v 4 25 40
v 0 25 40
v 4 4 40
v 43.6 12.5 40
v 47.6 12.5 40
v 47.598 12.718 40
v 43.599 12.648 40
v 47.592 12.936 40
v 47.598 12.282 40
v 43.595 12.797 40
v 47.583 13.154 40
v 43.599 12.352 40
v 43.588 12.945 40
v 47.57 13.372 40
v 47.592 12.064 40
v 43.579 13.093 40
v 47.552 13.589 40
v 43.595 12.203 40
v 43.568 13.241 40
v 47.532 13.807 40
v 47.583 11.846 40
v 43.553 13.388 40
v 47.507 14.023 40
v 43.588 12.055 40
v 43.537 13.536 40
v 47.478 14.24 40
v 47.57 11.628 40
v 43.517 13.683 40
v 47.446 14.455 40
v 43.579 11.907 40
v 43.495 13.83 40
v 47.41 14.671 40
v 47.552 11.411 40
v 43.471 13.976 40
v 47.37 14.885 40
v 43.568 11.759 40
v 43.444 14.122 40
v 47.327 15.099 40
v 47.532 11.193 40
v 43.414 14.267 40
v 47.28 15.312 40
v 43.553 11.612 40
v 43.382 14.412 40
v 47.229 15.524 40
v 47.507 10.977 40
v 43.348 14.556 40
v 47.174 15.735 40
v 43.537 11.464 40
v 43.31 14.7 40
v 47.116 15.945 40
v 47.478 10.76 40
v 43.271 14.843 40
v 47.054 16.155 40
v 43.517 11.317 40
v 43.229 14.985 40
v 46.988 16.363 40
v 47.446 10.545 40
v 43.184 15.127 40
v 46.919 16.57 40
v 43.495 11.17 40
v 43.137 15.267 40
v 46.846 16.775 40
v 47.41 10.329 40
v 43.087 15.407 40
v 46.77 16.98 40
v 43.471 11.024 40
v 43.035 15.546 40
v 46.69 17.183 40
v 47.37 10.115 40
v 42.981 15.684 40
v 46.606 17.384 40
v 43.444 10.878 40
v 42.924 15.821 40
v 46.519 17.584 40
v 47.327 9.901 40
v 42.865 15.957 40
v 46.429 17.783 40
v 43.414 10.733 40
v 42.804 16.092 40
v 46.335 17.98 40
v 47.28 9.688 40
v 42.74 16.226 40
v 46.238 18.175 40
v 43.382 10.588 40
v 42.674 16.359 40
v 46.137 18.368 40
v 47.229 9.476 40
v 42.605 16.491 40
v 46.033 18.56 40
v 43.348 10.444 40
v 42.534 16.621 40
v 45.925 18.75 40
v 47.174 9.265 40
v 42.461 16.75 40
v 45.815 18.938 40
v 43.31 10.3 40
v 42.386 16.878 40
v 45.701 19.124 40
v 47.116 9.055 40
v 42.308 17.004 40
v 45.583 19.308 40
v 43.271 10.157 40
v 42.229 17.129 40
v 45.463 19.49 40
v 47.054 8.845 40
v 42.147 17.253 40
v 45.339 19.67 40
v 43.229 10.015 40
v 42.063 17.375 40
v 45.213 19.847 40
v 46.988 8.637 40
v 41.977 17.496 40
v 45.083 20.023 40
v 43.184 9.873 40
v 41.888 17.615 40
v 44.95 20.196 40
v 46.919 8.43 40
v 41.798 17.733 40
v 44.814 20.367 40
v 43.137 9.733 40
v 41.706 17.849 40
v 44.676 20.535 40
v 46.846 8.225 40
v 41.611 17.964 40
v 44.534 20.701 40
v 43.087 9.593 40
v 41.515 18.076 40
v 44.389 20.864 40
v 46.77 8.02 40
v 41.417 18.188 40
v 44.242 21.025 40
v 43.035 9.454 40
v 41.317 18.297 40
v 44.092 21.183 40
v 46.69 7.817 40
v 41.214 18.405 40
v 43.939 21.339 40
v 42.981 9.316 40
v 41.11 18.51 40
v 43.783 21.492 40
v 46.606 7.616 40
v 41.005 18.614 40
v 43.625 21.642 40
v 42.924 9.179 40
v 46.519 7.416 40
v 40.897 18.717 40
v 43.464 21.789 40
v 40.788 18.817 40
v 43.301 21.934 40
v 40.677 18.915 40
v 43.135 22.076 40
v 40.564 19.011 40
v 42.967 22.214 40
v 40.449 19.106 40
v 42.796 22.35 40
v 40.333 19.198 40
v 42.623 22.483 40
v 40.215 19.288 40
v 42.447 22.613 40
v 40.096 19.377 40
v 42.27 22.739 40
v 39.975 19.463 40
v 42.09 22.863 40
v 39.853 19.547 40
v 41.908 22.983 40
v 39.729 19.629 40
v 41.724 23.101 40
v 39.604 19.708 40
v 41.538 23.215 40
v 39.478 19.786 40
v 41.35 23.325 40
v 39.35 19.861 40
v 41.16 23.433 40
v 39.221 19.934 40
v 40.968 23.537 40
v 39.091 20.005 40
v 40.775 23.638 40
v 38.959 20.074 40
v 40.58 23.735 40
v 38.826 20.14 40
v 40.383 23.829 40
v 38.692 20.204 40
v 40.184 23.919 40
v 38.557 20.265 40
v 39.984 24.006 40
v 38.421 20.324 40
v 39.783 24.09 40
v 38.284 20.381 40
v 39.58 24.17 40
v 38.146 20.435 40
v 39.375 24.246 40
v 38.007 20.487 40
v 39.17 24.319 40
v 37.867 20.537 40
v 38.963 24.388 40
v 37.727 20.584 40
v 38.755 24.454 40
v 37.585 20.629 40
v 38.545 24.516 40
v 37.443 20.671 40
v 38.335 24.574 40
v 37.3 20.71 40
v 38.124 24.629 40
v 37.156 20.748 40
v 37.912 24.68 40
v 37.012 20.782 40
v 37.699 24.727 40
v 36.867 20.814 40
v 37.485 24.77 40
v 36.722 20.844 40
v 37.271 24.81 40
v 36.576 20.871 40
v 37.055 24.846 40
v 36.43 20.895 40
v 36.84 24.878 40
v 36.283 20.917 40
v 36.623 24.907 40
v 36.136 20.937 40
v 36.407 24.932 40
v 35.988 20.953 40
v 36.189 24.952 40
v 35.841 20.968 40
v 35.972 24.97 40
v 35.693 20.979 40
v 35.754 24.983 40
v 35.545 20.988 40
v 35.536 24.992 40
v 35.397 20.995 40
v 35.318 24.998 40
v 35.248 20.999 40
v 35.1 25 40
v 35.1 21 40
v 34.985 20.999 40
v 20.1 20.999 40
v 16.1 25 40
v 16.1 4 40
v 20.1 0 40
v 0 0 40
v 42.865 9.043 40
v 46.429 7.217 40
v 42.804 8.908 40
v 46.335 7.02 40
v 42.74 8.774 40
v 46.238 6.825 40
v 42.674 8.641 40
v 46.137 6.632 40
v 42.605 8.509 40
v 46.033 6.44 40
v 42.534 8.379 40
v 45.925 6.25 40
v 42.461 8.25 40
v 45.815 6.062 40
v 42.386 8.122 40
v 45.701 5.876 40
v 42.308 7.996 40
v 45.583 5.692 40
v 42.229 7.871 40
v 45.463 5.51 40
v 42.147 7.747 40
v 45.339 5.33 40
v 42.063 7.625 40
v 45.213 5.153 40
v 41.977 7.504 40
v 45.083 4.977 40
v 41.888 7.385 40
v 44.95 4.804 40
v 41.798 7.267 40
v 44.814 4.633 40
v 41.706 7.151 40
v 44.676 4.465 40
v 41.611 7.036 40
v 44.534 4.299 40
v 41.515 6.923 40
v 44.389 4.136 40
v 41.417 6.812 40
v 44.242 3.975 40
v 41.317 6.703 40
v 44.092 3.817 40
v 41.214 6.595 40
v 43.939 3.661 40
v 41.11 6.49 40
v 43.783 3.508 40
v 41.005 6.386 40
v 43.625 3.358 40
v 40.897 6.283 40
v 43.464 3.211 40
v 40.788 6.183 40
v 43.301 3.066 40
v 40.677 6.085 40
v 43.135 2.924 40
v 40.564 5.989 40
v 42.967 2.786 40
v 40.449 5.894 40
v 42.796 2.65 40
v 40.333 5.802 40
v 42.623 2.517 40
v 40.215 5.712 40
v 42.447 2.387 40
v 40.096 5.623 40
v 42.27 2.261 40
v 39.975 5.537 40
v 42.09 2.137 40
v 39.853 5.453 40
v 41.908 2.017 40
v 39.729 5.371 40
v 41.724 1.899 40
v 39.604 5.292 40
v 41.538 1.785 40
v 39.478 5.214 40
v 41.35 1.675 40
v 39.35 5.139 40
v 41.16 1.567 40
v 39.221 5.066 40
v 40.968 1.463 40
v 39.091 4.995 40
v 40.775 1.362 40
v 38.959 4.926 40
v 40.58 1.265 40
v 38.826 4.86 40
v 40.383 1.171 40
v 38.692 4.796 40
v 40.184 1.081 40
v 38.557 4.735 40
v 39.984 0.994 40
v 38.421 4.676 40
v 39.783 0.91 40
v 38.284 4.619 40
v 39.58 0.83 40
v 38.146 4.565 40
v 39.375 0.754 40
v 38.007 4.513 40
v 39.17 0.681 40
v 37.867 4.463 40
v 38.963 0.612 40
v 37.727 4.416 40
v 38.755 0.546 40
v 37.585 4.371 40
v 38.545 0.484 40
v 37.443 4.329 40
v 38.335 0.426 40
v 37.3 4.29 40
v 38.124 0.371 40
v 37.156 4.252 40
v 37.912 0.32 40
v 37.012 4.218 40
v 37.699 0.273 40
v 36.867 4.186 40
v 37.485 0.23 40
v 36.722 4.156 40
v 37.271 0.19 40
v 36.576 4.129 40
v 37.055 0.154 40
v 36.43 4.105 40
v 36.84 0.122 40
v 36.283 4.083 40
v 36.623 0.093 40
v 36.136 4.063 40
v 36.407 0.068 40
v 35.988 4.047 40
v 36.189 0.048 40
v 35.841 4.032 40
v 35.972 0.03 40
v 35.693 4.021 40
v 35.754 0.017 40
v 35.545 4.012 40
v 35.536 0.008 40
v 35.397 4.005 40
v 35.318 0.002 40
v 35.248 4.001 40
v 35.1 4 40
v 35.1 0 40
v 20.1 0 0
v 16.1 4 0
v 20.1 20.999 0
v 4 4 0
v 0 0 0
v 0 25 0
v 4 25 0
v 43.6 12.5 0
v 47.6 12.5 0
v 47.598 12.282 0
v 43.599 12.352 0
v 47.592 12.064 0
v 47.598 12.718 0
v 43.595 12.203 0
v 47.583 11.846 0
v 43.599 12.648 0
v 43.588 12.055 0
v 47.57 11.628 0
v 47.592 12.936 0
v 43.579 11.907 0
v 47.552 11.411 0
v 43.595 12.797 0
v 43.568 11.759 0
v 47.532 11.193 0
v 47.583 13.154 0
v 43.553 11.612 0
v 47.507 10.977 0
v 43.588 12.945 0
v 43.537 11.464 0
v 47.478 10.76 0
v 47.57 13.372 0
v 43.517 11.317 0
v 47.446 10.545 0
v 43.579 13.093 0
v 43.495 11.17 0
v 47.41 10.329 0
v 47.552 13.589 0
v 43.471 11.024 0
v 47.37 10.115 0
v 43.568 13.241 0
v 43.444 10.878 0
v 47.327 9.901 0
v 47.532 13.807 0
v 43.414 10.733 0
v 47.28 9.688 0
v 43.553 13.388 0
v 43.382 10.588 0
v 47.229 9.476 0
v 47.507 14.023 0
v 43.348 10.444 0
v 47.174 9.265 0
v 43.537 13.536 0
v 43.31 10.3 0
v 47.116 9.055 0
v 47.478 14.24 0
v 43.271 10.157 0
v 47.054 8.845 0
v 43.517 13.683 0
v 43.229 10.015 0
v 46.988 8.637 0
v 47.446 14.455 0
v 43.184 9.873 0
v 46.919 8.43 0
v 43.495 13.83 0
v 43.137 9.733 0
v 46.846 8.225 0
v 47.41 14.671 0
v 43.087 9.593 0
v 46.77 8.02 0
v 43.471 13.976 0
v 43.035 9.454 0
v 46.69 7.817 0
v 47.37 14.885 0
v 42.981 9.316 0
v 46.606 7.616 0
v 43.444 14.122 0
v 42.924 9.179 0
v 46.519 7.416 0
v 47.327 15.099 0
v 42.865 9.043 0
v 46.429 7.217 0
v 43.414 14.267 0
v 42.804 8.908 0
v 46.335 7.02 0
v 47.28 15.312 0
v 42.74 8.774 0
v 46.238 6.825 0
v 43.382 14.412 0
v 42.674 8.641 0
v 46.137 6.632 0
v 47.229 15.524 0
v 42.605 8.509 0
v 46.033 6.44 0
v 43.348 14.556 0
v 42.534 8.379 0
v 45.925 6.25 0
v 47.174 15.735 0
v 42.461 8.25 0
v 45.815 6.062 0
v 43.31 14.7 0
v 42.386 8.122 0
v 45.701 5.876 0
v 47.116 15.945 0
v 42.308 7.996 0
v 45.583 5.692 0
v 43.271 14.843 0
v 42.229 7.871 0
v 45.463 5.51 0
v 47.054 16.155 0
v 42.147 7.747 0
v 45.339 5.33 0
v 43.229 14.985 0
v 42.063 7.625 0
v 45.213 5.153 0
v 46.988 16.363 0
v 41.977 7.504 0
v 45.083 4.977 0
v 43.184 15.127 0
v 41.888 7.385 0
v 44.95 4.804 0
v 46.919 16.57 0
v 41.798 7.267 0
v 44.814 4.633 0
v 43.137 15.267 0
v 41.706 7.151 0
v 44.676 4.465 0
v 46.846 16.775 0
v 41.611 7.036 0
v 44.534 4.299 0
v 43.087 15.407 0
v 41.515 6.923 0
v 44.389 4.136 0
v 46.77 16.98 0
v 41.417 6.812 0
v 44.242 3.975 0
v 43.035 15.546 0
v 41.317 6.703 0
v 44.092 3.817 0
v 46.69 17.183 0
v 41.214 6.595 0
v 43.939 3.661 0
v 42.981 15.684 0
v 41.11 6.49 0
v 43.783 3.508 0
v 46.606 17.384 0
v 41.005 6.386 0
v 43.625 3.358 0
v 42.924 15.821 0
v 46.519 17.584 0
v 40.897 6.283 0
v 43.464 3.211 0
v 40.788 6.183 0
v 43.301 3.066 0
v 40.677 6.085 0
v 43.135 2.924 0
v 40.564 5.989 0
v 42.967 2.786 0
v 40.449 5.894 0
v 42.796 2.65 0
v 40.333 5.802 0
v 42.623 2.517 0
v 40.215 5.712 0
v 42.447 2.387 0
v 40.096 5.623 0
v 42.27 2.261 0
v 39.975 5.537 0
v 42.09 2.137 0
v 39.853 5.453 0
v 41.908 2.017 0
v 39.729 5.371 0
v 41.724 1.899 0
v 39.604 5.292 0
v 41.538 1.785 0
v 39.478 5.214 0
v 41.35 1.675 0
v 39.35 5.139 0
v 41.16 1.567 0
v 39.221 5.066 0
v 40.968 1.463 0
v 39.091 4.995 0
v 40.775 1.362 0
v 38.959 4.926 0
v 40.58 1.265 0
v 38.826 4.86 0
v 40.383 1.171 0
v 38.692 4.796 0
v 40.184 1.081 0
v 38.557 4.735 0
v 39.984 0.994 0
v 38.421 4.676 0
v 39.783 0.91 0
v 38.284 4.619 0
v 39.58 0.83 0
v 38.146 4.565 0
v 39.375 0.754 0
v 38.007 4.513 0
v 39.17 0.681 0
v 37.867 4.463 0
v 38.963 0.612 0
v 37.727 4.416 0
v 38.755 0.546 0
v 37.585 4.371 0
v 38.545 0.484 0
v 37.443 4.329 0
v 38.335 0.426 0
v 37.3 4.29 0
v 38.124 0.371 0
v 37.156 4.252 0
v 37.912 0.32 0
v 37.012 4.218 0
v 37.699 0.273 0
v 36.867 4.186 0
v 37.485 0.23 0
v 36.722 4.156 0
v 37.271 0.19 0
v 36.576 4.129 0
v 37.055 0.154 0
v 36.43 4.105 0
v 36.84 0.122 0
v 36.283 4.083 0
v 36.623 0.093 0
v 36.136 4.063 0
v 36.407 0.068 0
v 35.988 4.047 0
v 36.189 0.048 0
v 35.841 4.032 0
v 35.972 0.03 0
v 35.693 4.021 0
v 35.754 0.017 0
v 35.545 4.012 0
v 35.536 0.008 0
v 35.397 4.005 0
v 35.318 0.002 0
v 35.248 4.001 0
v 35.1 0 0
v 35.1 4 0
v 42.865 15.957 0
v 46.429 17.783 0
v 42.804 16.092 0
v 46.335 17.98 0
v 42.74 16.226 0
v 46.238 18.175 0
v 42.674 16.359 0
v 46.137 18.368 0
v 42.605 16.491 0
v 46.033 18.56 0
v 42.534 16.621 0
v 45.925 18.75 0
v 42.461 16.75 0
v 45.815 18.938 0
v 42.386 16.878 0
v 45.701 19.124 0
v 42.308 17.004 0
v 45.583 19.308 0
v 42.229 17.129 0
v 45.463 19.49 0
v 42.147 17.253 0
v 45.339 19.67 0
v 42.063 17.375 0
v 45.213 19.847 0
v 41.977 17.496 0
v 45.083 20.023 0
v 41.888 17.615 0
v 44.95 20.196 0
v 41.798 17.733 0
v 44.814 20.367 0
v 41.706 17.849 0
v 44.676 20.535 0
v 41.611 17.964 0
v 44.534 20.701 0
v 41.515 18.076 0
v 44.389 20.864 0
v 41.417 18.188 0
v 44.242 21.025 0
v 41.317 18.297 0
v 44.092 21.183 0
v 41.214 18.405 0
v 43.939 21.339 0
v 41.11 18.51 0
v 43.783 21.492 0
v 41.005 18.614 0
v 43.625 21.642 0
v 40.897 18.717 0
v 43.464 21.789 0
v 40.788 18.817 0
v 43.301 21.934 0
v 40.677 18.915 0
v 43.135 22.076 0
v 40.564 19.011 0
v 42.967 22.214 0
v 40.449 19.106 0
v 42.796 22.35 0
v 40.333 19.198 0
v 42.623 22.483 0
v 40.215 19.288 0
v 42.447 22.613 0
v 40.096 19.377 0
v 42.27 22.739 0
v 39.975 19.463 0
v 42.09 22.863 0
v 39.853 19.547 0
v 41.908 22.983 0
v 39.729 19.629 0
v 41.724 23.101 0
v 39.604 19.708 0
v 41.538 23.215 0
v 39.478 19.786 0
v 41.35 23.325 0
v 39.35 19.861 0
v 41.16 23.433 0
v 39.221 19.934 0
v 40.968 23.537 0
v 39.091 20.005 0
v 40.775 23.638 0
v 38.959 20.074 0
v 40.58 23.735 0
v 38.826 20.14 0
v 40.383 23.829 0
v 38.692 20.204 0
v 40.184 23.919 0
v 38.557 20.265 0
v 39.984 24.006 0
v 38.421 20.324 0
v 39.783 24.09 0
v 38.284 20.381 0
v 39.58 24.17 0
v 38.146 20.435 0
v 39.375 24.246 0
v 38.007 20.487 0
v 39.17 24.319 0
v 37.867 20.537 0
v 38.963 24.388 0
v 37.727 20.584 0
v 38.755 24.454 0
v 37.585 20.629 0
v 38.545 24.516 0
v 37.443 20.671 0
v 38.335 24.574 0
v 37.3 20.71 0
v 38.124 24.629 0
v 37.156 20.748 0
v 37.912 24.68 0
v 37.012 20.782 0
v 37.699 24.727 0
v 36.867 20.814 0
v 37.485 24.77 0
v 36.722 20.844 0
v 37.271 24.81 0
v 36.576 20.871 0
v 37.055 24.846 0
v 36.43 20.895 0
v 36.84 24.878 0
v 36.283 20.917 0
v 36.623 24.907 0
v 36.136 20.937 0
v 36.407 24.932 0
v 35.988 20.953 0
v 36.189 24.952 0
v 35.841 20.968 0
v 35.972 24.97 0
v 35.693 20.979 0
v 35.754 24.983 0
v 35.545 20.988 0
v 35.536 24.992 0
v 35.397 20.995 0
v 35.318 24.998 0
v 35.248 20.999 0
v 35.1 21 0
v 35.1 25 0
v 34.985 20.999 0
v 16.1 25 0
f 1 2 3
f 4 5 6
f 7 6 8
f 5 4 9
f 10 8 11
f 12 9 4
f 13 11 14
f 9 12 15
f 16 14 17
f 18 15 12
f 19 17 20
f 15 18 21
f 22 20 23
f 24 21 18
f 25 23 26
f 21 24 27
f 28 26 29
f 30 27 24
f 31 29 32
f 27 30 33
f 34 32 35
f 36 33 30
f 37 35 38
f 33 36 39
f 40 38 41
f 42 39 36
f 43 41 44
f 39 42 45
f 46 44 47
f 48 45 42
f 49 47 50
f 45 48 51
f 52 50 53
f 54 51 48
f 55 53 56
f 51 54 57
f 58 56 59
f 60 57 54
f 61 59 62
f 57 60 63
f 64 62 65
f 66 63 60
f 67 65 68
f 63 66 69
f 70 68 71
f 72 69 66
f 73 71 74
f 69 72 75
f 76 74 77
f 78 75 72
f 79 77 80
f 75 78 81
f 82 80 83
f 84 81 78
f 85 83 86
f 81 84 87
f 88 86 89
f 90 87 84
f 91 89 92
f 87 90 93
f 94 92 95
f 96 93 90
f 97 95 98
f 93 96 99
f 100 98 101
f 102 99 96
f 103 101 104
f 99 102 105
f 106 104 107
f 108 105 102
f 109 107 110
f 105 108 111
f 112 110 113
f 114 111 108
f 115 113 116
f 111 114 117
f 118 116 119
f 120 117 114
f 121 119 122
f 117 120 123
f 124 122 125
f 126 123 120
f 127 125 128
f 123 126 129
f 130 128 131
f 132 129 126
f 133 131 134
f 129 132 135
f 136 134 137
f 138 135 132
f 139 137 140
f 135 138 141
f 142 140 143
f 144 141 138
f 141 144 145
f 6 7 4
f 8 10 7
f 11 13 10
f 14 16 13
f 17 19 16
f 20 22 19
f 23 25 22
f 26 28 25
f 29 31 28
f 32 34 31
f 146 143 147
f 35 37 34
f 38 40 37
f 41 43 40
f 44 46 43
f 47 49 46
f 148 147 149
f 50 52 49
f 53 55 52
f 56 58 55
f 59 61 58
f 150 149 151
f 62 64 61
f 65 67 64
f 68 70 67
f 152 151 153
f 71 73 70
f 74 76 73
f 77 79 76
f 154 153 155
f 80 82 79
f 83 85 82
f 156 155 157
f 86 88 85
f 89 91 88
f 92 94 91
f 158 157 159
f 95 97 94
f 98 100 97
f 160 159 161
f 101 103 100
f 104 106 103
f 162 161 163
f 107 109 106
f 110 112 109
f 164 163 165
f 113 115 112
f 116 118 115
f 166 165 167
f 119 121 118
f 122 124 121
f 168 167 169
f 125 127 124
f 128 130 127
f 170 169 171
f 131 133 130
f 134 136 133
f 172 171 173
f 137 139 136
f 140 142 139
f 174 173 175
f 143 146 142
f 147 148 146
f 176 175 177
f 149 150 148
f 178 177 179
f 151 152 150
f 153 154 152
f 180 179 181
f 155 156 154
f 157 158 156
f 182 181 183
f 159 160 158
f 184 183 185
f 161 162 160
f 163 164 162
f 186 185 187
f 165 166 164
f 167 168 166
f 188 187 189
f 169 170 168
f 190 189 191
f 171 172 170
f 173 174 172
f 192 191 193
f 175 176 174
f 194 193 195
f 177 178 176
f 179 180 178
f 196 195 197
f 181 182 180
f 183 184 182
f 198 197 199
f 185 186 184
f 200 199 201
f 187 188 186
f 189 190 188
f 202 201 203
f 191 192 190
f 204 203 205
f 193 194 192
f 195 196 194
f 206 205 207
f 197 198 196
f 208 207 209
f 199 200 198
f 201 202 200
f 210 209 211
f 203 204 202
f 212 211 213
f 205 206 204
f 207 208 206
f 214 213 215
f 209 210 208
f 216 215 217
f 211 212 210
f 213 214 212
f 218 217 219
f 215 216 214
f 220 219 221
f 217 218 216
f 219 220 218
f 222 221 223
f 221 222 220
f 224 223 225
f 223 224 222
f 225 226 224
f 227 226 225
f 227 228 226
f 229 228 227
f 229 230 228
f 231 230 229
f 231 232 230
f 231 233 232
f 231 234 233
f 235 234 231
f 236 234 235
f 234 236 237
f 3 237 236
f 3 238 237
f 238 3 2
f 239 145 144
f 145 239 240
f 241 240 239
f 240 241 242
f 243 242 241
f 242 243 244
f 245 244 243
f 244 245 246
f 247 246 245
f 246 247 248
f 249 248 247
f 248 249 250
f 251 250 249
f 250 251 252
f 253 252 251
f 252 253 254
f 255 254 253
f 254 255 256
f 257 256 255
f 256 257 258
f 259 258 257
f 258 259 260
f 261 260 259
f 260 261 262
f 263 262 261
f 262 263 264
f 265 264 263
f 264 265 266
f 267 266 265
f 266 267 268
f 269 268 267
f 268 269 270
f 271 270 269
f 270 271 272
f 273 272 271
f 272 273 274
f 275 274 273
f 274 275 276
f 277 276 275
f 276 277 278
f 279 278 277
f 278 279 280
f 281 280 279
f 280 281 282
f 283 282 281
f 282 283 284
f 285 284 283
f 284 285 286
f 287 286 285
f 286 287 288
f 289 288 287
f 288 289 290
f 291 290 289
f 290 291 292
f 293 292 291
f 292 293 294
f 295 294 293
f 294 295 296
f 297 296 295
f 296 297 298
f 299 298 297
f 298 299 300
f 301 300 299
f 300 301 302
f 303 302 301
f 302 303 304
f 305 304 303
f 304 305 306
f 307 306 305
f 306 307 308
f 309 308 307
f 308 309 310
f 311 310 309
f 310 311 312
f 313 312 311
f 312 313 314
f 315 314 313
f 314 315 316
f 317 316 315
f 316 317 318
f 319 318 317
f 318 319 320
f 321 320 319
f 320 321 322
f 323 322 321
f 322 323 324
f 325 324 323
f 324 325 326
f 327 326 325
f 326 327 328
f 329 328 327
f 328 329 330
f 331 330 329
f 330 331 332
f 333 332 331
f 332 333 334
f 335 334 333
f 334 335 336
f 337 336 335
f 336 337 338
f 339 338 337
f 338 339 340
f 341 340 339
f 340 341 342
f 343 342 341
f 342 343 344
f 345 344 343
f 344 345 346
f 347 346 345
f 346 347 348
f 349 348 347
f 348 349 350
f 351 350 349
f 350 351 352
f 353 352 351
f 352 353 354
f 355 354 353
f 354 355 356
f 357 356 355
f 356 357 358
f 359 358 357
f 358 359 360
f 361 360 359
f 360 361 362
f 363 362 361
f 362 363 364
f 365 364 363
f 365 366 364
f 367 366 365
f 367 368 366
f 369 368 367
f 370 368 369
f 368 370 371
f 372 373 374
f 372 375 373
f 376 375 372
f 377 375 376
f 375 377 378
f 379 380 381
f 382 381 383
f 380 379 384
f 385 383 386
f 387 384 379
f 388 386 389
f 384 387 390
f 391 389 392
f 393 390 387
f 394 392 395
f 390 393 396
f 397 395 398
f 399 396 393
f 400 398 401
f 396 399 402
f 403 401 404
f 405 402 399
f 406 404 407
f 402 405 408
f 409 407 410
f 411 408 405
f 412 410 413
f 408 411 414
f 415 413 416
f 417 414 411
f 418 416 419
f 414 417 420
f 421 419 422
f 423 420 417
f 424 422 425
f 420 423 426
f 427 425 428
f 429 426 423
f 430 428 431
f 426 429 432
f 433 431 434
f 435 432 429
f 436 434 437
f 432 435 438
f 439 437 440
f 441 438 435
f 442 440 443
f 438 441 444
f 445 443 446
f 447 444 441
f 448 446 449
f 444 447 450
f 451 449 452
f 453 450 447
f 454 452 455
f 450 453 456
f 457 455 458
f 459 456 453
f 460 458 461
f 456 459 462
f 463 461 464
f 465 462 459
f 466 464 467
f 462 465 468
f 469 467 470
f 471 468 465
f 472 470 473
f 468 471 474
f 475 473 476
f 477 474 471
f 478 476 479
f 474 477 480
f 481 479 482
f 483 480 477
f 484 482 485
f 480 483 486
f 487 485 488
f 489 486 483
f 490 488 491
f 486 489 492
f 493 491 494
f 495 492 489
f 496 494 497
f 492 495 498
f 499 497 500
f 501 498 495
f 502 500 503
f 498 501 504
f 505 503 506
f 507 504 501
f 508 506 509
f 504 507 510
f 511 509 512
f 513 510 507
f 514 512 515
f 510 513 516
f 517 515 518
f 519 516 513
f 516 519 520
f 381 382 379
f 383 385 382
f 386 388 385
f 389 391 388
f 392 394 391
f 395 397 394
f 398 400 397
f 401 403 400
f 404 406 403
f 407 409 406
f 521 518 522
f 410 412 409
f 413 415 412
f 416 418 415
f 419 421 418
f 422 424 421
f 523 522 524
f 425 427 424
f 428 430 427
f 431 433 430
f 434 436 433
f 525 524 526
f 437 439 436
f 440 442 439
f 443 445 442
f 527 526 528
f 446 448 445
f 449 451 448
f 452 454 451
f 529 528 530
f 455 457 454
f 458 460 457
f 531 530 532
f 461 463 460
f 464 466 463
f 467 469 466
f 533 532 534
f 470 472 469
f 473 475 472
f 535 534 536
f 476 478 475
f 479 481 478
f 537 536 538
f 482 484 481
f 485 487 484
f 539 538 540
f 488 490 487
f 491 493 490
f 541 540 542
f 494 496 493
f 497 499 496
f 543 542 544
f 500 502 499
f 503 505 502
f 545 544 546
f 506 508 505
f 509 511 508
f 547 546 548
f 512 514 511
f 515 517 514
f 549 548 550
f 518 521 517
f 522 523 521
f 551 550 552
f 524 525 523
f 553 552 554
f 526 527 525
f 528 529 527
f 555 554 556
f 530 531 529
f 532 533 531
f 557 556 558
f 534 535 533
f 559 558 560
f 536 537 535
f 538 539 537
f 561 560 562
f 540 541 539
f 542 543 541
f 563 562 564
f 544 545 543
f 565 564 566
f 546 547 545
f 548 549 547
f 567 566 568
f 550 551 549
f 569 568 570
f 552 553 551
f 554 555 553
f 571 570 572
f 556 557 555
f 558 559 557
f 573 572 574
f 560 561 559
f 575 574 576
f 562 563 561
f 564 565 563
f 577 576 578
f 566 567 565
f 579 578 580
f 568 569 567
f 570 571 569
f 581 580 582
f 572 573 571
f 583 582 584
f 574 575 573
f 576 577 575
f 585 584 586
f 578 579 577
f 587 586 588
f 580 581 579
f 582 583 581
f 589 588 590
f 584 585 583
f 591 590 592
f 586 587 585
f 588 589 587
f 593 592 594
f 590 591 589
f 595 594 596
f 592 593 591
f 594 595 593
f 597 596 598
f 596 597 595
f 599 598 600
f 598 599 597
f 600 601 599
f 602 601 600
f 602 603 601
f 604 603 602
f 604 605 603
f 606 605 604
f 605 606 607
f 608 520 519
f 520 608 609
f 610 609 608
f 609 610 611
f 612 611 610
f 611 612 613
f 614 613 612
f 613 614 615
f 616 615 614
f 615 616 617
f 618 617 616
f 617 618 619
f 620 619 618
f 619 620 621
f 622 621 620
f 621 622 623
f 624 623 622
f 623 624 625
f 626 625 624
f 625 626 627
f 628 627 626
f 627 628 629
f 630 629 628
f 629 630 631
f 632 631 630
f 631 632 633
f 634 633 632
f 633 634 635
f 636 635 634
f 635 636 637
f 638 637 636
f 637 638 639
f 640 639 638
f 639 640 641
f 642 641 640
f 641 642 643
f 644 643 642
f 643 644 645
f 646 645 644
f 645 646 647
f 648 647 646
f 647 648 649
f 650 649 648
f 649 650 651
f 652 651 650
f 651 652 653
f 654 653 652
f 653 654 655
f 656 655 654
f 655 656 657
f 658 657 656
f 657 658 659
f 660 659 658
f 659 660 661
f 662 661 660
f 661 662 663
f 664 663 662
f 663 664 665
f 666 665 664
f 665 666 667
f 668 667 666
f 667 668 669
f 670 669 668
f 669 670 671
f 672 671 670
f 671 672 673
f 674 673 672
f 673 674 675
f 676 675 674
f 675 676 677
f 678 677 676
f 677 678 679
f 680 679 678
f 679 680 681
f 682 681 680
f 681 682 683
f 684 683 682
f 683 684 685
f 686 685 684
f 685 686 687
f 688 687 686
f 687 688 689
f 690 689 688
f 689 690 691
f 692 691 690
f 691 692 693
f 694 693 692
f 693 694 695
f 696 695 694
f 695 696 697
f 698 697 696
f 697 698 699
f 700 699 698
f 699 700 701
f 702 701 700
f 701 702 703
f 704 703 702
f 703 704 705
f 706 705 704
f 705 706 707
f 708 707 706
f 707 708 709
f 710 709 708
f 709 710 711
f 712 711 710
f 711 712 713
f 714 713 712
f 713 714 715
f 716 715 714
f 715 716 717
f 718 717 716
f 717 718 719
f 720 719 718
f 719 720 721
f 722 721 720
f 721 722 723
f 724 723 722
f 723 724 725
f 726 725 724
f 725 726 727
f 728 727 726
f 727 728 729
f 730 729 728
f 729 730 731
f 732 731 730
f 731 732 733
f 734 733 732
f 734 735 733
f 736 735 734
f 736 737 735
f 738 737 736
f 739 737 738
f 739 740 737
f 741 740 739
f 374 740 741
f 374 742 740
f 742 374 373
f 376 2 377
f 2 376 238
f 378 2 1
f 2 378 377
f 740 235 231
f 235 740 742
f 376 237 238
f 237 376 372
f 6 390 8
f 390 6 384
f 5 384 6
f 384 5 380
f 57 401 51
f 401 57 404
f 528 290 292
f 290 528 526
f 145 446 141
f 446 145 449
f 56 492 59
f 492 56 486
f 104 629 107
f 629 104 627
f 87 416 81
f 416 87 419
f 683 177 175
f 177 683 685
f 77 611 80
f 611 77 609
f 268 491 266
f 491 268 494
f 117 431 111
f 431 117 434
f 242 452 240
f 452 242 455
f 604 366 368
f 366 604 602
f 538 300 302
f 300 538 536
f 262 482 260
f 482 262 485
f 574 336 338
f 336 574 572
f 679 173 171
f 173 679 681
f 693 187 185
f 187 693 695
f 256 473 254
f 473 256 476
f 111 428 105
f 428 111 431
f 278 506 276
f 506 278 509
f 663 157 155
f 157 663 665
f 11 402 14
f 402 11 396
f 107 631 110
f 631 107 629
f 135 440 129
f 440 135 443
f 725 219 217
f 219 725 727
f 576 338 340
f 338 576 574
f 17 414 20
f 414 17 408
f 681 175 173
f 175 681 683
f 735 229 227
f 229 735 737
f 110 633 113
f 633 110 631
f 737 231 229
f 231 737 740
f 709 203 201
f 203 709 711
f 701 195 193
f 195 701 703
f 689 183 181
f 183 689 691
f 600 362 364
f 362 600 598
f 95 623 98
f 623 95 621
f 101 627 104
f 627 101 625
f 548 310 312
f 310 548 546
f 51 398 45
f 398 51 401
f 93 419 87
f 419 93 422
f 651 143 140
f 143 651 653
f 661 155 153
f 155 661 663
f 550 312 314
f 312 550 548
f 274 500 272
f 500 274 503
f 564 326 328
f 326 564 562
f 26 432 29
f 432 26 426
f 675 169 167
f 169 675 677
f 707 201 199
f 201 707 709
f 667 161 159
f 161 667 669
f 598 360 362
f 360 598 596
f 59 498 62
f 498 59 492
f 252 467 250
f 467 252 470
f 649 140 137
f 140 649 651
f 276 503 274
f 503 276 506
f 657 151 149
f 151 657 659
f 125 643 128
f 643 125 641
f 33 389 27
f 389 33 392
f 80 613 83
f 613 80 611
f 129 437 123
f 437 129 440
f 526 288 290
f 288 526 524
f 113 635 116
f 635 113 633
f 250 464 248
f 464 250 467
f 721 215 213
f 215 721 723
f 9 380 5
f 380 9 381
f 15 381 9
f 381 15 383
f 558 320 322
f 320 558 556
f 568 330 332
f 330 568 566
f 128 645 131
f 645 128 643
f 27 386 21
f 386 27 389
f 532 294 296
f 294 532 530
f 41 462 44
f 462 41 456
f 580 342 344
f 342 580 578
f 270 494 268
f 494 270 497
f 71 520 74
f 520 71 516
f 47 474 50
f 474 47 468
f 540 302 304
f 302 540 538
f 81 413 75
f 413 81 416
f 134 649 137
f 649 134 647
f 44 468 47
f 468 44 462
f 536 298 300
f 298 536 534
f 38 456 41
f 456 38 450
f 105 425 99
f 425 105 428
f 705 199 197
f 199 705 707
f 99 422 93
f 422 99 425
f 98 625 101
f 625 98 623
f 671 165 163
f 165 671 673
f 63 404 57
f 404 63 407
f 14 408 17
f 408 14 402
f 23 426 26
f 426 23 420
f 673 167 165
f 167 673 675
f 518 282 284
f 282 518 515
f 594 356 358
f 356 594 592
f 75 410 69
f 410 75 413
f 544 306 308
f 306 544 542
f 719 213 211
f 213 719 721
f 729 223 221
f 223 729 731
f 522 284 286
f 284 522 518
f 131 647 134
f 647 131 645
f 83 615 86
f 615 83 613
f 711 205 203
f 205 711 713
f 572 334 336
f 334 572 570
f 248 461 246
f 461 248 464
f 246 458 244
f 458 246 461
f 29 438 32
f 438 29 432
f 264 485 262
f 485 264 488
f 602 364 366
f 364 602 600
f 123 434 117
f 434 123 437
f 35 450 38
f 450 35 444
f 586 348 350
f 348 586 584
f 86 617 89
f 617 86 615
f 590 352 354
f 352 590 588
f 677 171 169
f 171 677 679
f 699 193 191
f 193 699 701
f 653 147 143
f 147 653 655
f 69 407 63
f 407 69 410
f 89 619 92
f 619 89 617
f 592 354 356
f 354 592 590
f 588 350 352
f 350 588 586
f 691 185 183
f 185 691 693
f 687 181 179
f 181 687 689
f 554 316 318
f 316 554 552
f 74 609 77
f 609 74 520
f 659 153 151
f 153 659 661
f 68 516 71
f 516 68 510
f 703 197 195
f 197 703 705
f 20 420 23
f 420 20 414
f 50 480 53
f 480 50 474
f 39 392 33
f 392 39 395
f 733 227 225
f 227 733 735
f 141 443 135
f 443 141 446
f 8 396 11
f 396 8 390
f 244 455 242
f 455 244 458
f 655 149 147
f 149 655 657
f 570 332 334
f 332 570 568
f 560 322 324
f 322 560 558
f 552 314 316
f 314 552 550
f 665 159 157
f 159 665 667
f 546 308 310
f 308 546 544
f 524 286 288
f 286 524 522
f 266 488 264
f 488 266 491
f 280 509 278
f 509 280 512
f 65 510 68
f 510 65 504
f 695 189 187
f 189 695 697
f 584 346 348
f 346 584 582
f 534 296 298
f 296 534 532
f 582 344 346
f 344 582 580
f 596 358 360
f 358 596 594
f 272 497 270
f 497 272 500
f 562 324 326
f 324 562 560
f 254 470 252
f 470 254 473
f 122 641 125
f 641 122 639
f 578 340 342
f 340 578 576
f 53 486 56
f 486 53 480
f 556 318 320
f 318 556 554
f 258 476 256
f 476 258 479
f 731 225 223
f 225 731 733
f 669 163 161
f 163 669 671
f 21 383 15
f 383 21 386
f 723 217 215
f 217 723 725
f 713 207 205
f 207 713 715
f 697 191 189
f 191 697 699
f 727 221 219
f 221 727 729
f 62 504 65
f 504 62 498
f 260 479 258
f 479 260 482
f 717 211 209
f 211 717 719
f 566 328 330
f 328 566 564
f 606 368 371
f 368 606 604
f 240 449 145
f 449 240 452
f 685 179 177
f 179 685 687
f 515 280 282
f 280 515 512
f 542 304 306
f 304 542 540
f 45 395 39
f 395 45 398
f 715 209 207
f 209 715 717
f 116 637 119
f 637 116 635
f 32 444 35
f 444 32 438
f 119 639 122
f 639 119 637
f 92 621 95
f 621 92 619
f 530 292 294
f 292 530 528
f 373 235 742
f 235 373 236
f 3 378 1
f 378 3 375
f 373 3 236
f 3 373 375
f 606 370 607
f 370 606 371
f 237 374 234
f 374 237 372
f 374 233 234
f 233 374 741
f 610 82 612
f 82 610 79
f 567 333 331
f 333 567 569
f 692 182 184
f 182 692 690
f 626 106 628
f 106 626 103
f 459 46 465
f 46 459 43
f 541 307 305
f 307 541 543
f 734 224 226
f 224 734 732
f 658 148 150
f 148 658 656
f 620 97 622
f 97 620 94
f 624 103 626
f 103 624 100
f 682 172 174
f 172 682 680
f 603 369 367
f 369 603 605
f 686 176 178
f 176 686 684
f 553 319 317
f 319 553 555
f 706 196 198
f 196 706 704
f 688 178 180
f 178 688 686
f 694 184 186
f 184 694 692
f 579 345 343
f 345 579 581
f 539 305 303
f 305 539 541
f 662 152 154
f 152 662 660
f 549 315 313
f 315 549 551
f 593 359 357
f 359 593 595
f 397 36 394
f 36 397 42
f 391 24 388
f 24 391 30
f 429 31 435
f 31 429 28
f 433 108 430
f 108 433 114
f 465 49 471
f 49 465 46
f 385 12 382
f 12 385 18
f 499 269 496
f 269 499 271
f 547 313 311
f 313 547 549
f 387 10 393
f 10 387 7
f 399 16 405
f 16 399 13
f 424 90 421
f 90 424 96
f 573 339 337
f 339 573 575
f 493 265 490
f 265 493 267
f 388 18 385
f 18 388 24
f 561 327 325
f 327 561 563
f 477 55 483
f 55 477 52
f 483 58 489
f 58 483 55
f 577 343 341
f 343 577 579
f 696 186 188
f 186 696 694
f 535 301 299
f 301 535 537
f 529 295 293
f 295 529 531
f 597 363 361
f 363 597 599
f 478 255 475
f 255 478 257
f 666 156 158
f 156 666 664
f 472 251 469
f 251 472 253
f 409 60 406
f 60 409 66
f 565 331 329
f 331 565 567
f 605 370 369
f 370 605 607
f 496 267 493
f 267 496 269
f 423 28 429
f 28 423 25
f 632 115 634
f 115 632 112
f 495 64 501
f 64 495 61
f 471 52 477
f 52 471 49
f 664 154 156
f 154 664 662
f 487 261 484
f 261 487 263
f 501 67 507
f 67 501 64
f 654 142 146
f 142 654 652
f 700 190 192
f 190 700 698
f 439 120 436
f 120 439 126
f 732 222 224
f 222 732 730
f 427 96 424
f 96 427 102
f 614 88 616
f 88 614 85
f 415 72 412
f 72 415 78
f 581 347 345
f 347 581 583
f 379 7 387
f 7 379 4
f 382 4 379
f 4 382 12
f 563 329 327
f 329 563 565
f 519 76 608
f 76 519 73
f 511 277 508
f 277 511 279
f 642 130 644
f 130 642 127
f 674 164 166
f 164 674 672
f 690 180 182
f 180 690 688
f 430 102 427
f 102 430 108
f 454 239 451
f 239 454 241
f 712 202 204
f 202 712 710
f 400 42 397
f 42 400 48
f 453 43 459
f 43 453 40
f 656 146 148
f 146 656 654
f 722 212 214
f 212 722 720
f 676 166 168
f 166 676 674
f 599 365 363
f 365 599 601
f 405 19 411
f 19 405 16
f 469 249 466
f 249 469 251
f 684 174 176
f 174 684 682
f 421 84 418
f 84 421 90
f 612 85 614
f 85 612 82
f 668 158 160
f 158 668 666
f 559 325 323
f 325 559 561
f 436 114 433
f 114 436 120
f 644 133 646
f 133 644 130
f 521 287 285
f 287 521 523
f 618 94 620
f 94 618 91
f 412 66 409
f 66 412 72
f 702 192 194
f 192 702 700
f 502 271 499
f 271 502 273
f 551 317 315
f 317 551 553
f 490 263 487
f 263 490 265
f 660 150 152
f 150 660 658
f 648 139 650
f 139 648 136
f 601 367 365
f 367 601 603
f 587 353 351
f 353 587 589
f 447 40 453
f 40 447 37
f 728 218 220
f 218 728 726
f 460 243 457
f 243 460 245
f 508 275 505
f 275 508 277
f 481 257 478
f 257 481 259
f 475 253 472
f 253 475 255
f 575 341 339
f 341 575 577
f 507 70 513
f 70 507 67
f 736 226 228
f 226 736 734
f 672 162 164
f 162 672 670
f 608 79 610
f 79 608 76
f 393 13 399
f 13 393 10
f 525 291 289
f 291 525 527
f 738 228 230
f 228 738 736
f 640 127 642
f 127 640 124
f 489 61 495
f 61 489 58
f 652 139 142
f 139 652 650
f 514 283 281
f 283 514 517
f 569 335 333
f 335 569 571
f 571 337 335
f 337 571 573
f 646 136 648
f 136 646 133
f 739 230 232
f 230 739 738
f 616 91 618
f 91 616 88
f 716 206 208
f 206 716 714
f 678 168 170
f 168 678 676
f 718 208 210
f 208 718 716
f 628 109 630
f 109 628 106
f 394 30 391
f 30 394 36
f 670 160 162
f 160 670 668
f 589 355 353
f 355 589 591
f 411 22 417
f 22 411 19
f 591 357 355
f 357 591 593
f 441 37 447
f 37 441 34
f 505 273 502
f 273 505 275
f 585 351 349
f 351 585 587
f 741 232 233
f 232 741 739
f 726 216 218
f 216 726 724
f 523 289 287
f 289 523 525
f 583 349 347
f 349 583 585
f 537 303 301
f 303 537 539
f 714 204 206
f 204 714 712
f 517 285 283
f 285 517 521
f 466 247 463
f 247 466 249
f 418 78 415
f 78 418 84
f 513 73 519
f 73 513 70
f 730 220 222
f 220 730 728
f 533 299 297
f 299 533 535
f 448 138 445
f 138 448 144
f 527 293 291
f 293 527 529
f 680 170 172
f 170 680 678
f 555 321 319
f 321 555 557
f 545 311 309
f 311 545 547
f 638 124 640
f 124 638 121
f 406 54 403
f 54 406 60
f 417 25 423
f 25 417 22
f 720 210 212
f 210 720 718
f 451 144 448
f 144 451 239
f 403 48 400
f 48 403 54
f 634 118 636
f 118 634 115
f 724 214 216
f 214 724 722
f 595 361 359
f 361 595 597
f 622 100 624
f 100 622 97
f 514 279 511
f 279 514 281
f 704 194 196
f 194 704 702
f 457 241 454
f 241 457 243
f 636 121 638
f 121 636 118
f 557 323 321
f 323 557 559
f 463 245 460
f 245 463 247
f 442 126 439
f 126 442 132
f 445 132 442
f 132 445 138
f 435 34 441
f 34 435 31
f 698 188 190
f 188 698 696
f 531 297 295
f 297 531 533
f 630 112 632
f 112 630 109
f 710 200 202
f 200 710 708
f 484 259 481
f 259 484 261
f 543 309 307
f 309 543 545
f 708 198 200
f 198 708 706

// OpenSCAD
// Stair Gate Latch

eps = 0.001;
$fa = 1.0;
$fs = 0.1;

item_h = 40;
item_d = 25;

// 12 + 0.1 tolerance
gap_width = 12.1;
thickness = 4;

latch_opening_width = 15;
inner_radius = (item_d - 2 * thickness) / 2;
outter_radius = item_d / 2;

item_w = 2 * thickness + gap_width + latch_opening_width + outter_radius;

// Main
difference() {
  latch_x = gap_width + 2 * thickness;
  cylinder_origin_x = latch_x + latch_opening_width;
  cylinder_origin_y = outter_radius;
  union () {
    cube([item_w - outter_radius, item_d, item_h]);
    translate([cylinder_origin_x, cylinder_origin_y, 0])
      cylinder(h=item_h, r=outter_radius);
  }
  translate([thickness, thickness, -eps])
    cube([gap_width, item_d, item_h + 2 * eps]);
  translate([latch_x, -eps, -eps])
    cube([latch_opening_width, item_d - thickness, item_h + 2 * eps]);
  translate([cylinder_origin_x, cylinder_origin_y, -eps])
    cylinder(h=item_h + 2 * eps, r=inner_radius);
}
